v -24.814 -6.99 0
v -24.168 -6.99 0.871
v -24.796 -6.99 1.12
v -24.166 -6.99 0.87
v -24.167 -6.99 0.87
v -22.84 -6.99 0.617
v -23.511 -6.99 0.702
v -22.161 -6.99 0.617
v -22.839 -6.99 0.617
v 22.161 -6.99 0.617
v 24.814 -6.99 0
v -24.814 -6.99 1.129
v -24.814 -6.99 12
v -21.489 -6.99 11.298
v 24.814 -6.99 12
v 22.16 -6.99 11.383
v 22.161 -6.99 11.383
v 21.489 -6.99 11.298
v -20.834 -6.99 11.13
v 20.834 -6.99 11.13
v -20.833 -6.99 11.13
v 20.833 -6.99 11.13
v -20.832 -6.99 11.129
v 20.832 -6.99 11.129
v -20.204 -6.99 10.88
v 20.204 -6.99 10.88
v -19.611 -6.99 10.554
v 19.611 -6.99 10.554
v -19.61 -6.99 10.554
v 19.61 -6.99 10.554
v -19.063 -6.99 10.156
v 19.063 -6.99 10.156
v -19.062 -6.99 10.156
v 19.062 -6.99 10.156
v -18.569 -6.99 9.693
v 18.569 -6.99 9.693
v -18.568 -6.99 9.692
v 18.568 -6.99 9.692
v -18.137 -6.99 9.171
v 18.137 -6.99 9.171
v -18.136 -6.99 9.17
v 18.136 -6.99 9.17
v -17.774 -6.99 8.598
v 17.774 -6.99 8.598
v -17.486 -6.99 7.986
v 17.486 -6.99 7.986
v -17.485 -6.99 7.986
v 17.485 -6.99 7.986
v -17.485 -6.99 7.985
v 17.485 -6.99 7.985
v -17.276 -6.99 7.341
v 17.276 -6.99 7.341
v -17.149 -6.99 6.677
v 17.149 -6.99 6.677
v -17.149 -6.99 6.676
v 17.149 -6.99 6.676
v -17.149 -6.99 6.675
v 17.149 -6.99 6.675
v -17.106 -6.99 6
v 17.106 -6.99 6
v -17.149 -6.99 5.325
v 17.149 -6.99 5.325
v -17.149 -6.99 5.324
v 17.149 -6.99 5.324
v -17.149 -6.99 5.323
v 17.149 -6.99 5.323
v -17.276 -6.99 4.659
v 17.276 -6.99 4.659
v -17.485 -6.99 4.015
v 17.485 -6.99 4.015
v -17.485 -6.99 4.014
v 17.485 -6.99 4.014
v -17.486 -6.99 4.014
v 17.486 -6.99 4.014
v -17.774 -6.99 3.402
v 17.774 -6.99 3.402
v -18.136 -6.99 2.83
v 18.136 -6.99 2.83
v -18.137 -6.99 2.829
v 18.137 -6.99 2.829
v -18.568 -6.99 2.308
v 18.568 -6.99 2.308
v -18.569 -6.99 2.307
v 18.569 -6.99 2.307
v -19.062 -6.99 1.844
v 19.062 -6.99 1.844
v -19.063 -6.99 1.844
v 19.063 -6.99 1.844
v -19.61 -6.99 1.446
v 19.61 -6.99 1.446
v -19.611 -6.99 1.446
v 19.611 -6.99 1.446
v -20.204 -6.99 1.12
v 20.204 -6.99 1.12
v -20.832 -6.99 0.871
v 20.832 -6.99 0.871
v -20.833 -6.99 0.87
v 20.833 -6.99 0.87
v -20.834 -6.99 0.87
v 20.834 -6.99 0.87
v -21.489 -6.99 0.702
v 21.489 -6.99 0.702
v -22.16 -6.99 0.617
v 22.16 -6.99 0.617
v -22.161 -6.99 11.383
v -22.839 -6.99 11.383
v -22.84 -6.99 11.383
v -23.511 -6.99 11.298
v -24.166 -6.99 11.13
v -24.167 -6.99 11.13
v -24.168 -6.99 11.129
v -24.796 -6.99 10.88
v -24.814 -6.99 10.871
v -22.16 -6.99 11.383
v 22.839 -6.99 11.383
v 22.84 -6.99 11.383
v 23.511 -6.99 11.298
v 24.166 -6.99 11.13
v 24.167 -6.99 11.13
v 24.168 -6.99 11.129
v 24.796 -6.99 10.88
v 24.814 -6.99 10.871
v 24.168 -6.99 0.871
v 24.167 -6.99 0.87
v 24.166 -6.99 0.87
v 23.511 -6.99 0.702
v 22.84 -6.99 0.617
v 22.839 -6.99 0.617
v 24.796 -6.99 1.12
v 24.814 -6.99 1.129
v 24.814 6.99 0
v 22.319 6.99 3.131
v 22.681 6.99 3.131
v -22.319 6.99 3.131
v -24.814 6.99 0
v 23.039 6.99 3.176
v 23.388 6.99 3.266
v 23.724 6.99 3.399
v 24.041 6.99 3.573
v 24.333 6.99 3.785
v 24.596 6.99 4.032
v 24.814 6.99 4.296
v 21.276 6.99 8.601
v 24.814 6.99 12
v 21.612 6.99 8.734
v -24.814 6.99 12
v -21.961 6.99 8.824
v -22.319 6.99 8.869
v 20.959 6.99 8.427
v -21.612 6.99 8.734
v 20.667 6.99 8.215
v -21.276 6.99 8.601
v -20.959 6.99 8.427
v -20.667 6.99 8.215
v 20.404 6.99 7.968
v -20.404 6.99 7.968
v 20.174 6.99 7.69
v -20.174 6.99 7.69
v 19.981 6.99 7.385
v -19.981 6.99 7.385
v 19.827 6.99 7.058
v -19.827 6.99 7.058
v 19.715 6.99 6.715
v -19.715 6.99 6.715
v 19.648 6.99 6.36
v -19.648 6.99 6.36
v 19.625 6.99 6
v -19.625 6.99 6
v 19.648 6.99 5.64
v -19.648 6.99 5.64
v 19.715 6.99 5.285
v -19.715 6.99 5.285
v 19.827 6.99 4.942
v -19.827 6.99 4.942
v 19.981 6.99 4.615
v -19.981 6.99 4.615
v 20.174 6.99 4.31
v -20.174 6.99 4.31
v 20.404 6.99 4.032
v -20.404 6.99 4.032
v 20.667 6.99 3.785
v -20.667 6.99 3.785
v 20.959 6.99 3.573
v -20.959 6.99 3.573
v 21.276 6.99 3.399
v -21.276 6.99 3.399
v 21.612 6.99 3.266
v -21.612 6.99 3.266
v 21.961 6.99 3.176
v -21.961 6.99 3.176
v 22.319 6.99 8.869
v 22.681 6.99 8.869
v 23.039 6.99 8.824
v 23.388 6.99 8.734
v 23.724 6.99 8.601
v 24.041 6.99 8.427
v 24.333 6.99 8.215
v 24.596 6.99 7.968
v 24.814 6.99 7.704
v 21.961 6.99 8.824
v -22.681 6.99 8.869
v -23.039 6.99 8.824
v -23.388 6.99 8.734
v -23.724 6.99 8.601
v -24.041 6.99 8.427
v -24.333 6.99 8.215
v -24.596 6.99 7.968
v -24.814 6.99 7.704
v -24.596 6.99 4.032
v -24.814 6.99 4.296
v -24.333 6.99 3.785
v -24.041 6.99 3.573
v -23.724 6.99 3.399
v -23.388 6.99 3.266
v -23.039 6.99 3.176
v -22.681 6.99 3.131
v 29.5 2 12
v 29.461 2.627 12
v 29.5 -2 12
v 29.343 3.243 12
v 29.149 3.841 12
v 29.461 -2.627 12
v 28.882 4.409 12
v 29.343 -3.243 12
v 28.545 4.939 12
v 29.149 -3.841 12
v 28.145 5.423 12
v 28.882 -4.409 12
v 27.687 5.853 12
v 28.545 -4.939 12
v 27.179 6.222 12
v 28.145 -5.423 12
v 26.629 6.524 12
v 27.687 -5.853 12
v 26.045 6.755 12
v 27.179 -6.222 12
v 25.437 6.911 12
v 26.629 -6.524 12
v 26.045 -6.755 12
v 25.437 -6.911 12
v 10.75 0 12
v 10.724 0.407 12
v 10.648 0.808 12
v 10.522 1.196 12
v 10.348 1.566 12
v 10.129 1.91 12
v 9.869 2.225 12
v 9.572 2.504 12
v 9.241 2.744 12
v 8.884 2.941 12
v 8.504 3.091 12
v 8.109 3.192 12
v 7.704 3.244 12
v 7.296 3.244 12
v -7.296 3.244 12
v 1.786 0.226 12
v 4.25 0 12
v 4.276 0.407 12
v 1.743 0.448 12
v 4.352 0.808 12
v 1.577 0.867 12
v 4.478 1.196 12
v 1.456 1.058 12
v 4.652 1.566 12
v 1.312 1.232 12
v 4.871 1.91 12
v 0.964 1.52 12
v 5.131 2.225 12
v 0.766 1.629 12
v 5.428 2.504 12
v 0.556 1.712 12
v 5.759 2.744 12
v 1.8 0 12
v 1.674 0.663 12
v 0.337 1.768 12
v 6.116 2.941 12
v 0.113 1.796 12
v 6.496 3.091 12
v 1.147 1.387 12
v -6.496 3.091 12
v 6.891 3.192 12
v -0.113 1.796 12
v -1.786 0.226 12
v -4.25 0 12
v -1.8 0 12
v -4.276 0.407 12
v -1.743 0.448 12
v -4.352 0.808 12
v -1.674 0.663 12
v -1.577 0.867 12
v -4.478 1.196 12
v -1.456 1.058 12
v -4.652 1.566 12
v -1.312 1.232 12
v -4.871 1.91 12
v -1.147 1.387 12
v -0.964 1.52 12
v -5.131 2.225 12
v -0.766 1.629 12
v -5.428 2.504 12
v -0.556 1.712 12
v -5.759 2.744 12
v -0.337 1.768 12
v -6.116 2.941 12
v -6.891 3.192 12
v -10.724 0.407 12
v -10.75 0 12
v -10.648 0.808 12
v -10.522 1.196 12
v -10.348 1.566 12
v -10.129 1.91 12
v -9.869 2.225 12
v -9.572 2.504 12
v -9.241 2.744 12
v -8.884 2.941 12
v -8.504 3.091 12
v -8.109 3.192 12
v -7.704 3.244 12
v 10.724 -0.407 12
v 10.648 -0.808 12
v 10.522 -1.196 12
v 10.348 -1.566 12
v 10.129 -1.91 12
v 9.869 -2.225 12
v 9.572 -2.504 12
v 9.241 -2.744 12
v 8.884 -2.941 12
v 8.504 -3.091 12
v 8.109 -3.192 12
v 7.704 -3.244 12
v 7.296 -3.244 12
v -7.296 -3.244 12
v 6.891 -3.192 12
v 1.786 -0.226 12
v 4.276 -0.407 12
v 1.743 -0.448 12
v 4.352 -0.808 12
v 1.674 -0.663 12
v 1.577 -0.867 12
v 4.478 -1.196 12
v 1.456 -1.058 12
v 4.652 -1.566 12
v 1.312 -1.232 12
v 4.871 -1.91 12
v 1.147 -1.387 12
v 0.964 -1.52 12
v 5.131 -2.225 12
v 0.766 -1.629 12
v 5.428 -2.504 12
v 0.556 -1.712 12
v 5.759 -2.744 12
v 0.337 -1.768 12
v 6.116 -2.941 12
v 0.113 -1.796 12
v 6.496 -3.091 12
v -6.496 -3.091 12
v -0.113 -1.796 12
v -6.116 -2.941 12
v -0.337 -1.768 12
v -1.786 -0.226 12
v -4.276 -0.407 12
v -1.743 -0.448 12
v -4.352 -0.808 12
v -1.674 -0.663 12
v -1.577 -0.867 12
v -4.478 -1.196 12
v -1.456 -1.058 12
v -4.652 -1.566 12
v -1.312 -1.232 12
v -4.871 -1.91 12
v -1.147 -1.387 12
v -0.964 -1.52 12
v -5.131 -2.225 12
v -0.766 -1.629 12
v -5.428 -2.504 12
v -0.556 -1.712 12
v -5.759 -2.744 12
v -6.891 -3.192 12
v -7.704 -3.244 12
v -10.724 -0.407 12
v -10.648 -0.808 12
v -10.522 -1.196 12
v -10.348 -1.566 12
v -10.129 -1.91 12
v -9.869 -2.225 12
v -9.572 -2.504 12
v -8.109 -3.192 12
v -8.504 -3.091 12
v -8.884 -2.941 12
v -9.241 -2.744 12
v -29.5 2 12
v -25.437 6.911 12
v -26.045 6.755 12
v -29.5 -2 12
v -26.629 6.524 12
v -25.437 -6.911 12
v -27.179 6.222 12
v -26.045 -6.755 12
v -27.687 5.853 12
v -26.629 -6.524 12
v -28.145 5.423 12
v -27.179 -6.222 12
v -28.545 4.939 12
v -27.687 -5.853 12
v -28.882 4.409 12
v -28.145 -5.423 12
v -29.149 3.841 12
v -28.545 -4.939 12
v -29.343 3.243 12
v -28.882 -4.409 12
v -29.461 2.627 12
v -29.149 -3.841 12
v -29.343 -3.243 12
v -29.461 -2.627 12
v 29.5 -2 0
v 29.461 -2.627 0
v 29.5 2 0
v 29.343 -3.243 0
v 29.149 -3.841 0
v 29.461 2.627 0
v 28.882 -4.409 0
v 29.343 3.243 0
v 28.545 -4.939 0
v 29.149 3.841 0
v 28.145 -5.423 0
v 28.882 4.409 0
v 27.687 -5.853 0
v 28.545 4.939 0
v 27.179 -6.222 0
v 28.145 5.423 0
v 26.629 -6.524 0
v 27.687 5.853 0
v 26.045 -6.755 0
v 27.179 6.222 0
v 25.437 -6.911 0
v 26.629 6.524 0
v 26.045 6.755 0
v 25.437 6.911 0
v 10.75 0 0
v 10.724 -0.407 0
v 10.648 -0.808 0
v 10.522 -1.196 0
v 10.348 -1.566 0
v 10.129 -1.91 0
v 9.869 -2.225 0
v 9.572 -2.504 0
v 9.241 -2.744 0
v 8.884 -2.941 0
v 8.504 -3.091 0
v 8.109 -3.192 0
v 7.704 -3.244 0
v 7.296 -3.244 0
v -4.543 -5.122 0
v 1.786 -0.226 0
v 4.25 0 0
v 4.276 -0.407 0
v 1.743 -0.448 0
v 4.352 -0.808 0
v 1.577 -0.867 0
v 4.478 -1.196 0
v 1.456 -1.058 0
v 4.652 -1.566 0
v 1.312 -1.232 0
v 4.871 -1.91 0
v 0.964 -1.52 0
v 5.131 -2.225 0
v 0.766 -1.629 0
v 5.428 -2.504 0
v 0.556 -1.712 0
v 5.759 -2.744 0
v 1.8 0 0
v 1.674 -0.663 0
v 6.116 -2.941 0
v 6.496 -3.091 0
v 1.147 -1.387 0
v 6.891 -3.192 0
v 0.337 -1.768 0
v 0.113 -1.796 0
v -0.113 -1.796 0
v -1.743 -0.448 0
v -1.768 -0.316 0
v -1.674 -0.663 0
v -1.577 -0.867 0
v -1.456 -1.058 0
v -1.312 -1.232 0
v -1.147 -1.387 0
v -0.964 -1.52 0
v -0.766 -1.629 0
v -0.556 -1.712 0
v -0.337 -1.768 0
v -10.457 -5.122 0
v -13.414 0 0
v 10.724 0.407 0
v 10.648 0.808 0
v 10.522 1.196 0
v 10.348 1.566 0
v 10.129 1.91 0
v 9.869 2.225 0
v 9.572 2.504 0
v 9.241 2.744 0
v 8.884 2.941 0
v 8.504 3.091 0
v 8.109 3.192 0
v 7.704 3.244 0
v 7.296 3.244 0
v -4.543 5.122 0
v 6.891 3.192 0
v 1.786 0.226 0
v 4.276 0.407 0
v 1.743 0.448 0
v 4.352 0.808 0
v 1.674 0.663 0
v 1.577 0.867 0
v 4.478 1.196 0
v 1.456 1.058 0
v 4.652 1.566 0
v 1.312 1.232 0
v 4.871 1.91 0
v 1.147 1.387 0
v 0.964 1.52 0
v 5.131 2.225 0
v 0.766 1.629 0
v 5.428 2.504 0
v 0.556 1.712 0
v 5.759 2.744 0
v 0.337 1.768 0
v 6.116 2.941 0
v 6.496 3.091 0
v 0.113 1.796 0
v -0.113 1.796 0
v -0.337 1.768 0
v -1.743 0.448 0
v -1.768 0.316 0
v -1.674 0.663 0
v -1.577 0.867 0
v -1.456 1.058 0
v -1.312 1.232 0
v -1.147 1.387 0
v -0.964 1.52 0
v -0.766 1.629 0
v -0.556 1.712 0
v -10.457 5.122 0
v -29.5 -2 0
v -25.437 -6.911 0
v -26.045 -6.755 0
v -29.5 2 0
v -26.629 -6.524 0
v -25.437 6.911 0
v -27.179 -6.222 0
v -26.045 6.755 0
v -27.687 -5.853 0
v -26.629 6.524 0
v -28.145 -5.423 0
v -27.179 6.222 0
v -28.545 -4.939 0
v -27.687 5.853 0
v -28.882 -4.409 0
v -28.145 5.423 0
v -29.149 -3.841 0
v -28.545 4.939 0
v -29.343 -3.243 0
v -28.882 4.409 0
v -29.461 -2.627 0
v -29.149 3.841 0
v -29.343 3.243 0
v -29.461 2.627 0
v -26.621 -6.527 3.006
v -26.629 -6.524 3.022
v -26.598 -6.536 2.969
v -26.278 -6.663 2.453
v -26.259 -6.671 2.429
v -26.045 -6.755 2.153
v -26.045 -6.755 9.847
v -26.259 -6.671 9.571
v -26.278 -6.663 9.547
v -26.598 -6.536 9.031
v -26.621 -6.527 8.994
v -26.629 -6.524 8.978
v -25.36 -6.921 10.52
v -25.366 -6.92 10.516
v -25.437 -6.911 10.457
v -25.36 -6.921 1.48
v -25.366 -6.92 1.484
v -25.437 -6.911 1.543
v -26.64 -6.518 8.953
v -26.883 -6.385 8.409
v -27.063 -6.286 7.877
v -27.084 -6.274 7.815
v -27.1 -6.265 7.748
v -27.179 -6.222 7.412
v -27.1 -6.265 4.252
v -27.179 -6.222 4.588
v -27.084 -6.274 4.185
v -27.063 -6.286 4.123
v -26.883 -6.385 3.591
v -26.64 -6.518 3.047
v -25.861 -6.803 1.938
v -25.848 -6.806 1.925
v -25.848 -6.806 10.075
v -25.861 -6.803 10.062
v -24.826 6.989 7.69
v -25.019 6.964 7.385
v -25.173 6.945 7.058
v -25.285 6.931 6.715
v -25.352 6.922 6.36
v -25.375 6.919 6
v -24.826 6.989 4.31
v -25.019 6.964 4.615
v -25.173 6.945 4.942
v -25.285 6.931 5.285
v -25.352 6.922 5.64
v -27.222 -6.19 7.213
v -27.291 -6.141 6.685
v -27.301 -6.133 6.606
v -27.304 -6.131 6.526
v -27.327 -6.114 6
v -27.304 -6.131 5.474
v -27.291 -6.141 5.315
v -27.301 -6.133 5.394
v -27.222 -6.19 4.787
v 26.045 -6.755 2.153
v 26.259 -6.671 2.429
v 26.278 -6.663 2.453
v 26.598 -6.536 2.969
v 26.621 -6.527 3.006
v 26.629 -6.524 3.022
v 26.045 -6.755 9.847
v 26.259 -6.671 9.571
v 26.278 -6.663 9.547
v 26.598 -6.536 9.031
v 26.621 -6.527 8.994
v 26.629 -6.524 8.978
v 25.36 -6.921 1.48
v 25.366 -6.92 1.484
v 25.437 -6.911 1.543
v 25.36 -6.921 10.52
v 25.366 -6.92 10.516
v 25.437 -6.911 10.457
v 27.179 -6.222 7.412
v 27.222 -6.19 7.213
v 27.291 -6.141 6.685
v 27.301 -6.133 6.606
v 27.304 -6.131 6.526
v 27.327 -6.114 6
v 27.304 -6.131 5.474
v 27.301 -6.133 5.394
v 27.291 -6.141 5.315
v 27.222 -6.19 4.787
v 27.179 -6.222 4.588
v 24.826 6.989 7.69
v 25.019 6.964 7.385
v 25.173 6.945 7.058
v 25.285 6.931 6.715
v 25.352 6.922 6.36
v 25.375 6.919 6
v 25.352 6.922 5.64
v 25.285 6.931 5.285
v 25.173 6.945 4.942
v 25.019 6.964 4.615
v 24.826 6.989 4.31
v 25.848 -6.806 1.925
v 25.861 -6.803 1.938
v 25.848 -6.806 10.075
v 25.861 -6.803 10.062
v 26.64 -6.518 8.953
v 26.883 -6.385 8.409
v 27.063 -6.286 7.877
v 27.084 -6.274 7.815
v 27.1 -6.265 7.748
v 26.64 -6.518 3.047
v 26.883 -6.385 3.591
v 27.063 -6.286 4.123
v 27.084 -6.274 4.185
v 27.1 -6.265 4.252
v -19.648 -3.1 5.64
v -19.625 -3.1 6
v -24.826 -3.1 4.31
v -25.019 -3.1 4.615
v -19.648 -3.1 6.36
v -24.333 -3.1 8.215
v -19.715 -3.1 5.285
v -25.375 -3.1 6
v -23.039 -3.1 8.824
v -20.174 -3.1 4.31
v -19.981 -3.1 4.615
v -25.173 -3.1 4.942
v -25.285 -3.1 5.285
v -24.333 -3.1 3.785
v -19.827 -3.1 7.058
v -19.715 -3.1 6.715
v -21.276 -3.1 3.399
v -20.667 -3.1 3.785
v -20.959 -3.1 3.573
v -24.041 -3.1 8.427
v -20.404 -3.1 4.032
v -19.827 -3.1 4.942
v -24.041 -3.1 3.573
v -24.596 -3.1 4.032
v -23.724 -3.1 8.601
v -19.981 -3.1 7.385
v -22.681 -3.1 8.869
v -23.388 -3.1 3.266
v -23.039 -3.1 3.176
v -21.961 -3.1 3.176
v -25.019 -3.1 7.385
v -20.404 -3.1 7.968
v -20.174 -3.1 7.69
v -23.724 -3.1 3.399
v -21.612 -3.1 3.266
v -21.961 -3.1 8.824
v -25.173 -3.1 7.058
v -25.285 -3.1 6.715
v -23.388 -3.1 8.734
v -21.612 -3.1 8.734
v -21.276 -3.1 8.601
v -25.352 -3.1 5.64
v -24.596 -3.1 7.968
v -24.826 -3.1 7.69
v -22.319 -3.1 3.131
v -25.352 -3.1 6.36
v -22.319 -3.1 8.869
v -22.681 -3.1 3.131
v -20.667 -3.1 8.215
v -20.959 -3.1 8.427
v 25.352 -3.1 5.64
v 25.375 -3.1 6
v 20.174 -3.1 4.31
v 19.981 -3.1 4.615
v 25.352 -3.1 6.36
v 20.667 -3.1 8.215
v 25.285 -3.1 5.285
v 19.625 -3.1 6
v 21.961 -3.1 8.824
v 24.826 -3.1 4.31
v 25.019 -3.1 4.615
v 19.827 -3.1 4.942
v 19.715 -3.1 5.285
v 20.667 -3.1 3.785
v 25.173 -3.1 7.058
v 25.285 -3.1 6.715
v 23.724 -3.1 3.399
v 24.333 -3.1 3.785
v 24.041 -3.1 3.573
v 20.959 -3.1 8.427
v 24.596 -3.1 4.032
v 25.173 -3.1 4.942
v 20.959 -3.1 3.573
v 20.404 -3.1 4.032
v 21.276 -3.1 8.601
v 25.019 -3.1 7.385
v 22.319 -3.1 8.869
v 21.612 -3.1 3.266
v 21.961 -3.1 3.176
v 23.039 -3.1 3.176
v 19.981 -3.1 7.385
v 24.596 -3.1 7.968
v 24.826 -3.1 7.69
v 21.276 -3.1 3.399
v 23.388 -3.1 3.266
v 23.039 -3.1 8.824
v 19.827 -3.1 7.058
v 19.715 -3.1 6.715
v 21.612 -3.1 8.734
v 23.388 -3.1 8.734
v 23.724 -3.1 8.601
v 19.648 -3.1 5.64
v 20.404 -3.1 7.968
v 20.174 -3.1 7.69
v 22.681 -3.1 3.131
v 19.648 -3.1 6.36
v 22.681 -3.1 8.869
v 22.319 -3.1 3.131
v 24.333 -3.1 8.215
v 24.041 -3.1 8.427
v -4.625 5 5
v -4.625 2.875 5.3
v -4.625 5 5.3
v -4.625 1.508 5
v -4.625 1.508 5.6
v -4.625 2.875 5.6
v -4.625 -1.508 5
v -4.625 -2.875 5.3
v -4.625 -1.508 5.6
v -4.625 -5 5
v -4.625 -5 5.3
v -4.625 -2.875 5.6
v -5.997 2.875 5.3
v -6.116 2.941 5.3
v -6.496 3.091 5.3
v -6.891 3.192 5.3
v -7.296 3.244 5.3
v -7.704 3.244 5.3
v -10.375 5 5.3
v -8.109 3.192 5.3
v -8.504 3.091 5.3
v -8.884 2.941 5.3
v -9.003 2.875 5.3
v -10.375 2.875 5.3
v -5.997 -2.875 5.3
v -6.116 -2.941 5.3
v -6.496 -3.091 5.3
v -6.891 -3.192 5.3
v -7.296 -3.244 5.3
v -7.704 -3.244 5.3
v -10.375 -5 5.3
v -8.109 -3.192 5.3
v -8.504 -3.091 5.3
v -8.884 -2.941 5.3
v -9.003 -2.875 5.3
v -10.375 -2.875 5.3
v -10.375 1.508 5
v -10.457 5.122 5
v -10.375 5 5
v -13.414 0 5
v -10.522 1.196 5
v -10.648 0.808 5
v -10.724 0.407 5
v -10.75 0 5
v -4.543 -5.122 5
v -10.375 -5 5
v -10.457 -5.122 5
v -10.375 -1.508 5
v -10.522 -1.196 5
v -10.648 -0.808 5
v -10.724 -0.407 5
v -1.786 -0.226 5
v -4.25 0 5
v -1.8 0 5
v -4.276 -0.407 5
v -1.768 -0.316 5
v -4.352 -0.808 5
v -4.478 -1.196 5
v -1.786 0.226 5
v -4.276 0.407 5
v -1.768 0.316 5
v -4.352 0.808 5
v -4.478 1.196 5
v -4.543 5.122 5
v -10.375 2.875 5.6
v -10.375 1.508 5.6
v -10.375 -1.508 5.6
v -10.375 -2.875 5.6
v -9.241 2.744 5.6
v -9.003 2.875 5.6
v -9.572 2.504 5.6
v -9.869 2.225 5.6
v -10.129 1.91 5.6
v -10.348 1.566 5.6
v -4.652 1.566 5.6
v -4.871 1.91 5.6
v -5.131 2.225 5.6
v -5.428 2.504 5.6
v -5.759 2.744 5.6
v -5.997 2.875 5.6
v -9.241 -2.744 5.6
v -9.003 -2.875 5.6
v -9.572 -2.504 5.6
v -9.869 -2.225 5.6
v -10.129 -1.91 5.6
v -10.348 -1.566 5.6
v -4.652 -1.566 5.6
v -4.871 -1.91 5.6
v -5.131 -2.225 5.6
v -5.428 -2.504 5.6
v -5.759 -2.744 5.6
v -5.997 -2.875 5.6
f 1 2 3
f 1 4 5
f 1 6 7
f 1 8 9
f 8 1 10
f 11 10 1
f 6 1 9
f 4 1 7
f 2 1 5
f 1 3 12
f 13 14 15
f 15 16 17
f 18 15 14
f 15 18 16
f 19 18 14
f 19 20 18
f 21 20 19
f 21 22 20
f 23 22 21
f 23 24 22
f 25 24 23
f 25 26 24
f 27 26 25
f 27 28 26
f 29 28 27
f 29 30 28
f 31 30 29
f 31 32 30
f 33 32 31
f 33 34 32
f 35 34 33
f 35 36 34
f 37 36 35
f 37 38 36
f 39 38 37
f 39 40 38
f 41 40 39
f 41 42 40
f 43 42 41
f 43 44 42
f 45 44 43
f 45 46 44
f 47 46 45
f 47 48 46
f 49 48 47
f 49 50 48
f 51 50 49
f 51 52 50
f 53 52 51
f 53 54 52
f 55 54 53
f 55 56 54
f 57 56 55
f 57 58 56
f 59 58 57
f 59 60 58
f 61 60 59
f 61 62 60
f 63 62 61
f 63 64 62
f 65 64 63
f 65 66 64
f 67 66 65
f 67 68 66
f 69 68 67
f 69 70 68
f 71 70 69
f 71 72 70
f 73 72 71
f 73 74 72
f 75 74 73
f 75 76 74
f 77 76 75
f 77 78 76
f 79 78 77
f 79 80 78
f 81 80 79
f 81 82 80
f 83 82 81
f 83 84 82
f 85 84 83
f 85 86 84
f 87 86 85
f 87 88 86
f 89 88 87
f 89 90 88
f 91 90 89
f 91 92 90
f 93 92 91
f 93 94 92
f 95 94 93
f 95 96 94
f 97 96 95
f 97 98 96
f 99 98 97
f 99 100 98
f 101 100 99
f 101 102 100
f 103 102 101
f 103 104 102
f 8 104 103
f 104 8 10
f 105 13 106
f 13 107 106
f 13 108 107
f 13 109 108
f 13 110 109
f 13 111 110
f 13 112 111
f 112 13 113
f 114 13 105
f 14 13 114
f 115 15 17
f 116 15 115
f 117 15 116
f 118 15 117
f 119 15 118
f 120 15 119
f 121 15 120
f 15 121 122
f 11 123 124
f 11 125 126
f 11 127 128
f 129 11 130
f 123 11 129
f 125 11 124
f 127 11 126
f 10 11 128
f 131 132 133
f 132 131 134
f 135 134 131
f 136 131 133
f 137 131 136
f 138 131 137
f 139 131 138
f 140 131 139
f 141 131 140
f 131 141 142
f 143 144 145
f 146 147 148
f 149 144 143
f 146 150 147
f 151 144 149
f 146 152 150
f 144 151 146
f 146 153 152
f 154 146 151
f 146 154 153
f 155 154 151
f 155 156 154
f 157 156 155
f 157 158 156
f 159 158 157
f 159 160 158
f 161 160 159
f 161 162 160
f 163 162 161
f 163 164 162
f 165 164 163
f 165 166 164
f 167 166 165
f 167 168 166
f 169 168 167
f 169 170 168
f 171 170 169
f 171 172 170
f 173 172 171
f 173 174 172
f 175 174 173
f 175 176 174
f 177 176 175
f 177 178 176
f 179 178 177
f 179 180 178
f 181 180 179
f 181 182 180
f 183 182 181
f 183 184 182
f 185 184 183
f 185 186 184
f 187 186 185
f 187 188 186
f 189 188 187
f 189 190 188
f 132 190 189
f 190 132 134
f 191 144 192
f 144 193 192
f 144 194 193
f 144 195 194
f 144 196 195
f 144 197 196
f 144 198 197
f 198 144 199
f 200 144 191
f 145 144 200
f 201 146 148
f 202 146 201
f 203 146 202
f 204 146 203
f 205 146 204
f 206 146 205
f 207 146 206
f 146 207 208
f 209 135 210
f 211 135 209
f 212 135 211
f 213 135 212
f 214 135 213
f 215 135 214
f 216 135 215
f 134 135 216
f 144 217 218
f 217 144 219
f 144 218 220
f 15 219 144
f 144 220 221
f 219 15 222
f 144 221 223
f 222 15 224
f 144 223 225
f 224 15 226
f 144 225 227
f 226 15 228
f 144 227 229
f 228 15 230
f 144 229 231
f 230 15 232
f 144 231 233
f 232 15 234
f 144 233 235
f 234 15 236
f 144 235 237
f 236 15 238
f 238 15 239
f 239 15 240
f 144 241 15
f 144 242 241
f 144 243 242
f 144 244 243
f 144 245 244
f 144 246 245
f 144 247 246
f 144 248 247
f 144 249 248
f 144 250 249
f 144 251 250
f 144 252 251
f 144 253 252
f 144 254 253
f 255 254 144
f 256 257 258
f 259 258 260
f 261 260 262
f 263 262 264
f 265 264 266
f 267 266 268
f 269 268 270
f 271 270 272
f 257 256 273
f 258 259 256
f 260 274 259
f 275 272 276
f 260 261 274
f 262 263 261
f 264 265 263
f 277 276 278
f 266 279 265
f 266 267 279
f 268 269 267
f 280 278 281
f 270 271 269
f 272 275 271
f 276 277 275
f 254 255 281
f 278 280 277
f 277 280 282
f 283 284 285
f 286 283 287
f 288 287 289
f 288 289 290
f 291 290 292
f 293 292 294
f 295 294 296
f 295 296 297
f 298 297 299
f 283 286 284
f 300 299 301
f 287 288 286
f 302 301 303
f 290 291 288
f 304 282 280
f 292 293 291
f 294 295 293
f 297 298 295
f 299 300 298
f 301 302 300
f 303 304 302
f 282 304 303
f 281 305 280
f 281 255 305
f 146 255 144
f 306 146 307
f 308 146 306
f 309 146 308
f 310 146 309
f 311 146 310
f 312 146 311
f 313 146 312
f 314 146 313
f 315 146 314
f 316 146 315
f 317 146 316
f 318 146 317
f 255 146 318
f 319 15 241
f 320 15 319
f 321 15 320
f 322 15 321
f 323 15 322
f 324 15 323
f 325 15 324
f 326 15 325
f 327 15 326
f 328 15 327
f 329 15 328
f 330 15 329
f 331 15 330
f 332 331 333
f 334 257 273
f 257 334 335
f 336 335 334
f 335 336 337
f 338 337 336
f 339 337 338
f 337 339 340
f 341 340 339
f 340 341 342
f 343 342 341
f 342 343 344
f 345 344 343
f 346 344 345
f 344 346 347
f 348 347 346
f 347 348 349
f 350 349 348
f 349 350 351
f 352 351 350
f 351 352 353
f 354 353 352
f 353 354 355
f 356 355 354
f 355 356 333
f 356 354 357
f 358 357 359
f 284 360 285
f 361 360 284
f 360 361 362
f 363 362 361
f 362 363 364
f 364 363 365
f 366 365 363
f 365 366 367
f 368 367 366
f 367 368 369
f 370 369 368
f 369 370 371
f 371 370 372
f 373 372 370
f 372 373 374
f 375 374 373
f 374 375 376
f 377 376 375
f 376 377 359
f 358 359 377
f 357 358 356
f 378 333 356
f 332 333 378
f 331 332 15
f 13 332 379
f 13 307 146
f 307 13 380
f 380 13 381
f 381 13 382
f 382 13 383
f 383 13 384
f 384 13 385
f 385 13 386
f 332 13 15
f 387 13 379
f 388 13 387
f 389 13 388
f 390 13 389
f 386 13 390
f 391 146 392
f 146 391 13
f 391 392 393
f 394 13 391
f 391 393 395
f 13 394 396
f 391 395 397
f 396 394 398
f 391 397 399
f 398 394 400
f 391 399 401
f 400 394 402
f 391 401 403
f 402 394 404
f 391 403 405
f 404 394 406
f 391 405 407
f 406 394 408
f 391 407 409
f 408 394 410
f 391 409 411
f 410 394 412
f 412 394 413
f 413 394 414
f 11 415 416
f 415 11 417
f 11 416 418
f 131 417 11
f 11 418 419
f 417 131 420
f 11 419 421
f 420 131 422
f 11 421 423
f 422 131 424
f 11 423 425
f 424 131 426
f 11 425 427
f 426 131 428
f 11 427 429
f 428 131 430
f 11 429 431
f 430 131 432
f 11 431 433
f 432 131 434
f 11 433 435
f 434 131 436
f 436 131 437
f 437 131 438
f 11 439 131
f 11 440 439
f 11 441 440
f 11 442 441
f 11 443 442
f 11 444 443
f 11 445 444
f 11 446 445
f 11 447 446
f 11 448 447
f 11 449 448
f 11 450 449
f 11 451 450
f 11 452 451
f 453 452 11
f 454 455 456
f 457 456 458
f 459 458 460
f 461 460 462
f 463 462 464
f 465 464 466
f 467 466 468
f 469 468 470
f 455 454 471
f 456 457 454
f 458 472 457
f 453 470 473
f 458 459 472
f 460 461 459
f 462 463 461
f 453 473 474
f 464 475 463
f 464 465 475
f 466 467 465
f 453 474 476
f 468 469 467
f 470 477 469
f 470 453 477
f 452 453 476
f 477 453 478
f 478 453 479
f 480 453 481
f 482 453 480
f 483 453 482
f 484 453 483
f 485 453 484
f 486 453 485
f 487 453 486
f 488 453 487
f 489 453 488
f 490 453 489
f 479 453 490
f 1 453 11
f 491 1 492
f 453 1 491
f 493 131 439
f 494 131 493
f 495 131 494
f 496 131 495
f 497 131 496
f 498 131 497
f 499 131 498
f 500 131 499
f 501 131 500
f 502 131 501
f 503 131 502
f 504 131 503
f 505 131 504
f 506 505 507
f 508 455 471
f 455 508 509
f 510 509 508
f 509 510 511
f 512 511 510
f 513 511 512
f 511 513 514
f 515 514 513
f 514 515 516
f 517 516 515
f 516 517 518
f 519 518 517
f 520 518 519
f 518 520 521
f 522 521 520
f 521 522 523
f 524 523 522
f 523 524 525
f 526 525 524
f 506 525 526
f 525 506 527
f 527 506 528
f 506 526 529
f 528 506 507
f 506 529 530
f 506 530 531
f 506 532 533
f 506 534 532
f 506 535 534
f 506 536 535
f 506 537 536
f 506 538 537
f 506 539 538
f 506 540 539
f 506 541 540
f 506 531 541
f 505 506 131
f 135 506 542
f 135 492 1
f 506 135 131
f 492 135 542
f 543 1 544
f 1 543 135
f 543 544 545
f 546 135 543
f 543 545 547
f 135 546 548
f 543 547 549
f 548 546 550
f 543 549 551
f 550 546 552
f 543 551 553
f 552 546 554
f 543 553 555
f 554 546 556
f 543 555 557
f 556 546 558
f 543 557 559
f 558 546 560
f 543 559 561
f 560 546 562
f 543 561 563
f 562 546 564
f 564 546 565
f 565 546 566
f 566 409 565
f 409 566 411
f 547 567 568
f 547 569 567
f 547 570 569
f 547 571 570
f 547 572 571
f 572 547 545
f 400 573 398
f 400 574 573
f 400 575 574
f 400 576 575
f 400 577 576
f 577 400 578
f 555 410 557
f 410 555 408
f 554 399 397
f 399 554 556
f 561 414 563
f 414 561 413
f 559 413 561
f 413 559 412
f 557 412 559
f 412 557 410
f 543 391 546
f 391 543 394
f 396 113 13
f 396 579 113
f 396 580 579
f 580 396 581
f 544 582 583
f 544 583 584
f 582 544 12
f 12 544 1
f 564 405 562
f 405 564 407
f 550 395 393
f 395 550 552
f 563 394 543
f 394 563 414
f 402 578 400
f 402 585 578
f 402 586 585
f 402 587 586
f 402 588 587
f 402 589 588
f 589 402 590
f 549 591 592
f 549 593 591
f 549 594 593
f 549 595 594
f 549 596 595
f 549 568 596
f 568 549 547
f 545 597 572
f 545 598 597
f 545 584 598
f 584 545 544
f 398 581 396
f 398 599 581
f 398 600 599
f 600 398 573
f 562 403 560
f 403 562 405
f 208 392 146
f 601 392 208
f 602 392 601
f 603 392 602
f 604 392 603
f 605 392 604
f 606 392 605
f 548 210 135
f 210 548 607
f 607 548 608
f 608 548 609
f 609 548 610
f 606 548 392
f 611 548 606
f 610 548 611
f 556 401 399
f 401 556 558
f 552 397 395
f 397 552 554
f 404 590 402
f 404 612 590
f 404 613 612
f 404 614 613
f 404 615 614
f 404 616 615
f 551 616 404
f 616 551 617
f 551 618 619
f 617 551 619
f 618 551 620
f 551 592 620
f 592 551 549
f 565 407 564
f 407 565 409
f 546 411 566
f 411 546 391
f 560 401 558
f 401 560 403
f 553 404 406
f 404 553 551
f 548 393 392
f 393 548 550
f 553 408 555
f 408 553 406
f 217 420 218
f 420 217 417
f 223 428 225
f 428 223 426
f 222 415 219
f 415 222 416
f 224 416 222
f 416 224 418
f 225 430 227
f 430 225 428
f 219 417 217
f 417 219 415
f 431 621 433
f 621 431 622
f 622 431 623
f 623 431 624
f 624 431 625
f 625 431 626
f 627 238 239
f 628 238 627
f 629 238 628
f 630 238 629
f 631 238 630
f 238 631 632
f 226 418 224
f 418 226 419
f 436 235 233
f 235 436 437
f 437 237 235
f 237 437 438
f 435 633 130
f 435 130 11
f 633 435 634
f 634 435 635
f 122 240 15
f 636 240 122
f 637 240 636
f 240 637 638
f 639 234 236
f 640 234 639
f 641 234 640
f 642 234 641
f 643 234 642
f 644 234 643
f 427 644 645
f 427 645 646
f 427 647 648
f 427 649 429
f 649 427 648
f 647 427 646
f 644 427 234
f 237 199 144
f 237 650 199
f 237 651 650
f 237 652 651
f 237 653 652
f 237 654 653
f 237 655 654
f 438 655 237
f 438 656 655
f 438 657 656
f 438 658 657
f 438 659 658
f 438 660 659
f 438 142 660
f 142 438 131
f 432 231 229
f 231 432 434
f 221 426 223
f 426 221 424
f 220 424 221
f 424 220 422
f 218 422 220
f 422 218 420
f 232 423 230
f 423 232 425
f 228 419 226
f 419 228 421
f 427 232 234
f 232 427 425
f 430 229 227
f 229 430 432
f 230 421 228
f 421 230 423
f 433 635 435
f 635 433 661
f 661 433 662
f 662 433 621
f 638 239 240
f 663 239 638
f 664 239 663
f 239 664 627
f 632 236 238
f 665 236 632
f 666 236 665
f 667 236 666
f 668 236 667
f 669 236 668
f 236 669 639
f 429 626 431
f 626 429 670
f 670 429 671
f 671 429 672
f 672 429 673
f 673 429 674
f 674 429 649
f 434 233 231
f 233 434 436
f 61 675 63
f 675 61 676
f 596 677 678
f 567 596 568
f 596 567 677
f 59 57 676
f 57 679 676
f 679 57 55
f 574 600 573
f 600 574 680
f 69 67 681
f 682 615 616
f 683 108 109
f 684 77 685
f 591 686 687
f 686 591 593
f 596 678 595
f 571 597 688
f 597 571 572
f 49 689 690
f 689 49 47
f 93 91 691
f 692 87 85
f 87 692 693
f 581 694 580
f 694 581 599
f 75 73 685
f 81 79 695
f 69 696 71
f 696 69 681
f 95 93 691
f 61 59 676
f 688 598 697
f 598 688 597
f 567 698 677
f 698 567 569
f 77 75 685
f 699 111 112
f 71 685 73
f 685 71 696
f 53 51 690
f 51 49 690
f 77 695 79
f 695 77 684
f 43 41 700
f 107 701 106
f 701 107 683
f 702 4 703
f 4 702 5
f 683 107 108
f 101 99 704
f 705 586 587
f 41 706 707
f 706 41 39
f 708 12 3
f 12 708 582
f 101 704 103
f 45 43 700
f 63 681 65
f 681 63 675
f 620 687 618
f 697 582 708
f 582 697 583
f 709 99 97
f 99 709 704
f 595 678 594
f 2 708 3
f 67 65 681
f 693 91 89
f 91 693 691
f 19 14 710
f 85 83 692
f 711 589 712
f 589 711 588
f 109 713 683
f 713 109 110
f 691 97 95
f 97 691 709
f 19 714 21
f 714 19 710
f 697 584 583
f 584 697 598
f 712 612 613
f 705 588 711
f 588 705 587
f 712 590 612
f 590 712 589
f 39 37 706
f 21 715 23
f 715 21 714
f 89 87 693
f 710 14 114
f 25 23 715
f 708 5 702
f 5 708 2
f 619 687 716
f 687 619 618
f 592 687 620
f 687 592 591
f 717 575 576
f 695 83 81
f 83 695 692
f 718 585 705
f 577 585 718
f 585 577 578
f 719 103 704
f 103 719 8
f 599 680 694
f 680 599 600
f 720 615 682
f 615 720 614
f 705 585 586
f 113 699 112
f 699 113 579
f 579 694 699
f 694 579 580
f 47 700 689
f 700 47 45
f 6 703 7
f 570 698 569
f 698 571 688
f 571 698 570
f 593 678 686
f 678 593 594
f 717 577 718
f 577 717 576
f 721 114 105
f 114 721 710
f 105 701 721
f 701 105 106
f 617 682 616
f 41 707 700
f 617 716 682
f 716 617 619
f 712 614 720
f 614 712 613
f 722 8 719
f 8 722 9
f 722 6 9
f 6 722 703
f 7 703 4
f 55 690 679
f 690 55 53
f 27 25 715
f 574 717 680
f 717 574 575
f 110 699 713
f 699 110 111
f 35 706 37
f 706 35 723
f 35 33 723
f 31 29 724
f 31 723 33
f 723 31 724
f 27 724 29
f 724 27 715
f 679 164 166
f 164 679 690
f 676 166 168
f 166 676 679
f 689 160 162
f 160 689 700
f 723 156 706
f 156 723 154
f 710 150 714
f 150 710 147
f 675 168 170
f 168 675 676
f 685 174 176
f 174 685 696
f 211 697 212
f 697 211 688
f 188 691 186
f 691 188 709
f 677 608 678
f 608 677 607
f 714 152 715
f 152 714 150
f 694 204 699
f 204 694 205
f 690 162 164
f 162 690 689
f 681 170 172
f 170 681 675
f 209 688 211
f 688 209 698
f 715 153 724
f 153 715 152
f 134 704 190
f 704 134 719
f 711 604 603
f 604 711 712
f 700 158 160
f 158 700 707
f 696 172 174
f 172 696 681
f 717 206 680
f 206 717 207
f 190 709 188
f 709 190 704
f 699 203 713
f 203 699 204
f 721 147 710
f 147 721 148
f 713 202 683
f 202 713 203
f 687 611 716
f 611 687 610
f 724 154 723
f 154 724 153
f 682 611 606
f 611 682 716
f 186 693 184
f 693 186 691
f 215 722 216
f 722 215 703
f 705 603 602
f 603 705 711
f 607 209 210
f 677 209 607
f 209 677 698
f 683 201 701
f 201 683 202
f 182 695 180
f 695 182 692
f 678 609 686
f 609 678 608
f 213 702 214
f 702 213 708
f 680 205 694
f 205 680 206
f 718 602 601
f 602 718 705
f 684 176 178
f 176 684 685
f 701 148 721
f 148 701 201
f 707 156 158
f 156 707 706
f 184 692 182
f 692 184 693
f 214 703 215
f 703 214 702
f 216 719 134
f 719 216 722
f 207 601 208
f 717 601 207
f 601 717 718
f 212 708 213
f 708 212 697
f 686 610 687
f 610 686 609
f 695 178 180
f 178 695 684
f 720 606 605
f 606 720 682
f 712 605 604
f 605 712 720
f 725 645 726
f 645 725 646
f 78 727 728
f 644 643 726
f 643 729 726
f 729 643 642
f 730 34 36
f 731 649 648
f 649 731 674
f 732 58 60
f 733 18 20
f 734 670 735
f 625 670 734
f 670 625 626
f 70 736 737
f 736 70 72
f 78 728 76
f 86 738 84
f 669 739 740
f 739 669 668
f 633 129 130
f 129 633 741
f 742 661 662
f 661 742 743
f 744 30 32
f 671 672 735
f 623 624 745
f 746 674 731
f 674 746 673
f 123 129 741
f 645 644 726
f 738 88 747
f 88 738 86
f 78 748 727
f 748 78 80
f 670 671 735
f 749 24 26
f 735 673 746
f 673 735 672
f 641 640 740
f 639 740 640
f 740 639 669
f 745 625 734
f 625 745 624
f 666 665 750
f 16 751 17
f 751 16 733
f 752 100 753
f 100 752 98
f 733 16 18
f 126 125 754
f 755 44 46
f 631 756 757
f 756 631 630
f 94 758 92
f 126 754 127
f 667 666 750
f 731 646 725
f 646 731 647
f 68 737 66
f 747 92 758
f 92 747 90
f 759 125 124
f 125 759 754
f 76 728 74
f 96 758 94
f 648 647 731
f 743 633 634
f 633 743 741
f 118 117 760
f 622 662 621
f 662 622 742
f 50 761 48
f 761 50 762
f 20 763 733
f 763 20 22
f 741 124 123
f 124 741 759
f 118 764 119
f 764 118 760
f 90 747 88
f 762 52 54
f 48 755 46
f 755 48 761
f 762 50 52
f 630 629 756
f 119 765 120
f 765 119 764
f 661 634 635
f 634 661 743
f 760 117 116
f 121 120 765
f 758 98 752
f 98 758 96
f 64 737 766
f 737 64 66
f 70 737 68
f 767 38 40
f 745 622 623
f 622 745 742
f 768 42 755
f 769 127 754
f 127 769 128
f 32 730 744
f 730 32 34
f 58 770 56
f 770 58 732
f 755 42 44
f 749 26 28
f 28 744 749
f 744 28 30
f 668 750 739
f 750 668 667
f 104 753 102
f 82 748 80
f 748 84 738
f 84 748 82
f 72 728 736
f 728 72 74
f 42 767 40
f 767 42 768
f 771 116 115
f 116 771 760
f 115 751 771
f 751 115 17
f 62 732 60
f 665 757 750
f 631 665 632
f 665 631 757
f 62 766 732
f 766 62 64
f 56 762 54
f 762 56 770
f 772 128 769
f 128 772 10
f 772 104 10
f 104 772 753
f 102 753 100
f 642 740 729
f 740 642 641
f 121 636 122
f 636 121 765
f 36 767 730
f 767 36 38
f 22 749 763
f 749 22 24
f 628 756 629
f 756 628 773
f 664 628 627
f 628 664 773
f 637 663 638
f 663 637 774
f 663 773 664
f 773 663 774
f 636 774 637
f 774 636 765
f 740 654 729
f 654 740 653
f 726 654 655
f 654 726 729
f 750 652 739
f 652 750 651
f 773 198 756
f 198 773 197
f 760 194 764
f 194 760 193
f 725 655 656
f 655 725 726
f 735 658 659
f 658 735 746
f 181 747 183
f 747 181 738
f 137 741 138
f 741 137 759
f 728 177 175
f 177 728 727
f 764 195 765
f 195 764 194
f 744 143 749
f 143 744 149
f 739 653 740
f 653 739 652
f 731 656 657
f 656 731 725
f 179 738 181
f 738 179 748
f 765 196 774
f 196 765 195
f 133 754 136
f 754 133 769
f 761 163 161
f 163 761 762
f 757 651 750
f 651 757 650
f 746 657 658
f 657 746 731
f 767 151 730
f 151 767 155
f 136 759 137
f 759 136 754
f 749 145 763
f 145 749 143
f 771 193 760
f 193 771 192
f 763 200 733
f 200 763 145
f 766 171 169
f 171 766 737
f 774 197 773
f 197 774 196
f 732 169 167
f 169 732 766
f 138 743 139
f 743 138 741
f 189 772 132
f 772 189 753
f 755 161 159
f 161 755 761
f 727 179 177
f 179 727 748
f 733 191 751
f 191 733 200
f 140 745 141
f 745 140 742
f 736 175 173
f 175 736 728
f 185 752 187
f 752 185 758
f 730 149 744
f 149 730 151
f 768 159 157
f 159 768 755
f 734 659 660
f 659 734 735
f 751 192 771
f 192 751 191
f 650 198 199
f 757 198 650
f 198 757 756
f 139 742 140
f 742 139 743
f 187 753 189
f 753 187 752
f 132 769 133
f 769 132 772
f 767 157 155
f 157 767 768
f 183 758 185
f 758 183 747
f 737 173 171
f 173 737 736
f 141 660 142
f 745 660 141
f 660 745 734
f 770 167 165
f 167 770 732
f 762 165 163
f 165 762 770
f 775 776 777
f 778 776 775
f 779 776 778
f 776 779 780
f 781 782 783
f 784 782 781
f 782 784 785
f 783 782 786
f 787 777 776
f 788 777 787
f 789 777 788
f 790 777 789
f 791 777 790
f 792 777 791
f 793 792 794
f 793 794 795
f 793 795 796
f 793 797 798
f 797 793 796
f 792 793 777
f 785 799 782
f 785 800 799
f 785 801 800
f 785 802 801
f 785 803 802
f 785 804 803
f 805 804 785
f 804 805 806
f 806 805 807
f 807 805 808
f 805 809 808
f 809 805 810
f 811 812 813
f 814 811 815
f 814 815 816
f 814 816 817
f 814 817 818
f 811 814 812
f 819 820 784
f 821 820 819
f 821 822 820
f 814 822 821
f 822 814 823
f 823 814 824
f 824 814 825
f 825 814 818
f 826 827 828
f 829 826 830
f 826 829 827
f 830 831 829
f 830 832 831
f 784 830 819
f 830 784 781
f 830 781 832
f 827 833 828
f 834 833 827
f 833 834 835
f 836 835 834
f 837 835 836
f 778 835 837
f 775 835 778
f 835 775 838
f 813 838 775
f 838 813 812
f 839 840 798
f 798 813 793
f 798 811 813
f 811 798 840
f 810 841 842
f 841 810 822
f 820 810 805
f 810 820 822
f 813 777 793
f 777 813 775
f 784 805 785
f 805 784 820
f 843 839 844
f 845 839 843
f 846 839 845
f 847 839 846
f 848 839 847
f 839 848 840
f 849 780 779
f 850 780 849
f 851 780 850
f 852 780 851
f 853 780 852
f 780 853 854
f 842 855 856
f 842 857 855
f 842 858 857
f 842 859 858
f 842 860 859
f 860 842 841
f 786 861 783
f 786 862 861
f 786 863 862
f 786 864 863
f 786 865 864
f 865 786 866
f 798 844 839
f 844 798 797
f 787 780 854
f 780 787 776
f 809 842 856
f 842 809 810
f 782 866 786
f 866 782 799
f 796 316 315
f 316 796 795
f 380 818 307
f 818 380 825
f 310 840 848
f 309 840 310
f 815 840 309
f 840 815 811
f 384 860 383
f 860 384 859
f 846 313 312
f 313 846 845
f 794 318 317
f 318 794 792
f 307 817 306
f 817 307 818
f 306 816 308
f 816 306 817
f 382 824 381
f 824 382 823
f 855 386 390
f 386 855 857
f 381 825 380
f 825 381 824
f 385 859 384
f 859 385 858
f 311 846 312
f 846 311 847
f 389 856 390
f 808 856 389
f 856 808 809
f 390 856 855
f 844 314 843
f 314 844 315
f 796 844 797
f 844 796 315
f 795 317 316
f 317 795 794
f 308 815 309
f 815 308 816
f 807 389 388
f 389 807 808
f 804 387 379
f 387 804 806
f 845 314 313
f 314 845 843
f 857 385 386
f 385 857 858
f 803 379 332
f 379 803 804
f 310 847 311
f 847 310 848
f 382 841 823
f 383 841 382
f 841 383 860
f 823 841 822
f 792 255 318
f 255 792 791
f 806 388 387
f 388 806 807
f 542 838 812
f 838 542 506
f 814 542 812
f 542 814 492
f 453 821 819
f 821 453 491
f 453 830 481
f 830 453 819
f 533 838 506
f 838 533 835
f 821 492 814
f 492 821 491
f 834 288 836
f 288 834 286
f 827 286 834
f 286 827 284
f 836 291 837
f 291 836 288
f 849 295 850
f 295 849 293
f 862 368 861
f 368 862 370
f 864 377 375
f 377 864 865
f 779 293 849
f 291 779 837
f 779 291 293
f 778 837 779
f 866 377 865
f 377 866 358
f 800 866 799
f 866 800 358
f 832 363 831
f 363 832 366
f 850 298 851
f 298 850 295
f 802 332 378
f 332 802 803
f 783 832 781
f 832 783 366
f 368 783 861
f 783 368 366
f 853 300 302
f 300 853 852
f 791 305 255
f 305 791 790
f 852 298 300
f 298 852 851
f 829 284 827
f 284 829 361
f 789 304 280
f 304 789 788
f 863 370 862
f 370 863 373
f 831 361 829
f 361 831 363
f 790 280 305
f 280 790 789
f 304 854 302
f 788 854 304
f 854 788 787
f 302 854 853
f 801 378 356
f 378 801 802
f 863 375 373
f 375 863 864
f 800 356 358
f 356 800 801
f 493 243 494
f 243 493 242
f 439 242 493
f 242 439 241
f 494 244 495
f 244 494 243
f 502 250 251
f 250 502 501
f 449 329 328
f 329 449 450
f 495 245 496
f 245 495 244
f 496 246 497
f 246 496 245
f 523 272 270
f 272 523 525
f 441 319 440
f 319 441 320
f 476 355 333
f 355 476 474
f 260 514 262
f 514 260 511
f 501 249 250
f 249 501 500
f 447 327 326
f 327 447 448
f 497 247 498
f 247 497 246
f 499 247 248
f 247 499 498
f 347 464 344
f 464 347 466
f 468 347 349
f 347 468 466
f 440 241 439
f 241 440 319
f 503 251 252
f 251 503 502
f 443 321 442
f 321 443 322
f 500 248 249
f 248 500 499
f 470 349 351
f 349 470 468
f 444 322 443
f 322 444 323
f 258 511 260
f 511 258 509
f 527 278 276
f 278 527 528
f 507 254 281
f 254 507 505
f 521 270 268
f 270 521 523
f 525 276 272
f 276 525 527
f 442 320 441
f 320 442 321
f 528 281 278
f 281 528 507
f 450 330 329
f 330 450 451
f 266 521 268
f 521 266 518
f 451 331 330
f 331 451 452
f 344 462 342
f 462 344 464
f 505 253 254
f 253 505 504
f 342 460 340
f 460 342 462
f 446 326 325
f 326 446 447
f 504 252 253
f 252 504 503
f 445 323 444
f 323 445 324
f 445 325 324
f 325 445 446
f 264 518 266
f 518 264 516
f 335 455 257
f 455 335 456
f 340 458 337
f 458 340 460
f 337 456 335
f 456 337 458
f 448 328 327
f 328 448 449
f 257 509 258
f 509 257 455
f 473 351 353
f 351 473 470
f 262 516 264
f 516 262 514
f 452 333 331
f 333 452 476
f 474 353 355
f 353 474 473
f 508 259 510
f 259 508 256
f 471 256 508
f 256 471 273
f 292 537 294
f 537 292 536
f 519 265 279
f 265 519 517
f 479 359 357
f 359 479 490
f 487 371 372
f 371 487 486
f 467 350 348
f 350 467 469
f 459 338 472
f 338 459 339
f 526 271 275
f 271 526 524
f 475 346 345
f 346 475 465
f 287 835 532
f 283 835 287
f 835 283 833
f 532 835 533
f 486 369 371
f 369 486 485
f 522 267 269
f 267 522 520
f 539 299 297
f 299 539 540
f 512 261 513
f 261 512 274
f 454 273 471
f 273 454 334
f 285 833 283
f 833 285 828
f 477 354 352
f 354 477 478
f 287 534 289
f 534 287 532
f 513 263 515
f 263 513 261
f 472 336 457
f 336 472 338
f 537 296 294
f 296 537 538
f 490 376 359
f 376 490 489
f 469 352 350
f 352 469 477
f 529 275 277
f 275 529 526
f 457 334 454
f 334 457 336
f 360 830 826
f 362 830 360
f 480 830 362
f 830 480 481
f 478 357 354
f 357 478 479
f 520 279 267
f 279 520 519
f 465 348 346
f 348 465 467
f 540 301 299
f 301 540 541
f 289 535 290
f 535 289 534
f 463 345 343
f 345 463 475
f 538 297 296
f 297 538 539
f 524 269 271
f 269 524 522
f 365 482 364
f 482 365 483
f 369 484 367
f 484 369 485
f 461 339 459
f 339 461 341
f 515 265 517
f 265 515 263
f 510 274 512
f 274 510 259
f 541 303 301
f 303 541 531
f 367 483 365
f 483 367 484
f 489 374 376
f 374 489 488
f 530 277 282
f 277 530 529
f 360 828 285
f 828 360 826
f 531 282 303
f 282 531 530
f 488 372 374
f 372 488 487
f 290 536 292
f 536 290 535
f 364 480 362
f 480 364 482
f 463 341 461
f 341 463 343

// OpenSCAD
$fn = 50;


difference() {
	union() {
		hull() {
			translate(v = [-9.5000000000, 2.0000000000, 0]) {
				cylinder(h = 12, r = 5);
			}
			translate(v = [9.5000000000, 2.0000000000, 0]) {
				cylinder(h = 12, r = 5);
			}
			translate(v = [-9.5000000000, -2.0000000000, 0]) {
				cylinder(h = 12, r = 5);
			}
			translate(v = [9.5000000000, -2.0000000000, 0]) {
				cylinder(h = 12, r = 5);
			}
		}
		translate(v = [-15.0000000000, 0.0000000000, 0]) {
			hull() {
				translate(v = [-9.5000000000, 2.0000000000, 0]) {
					cylinder(h = 12, r = 5);
				}
				translate(v = [9.5000000000, 2.0000000000, 0]) {
					cylinder(h = 12, r = 5);
				}
				translate(v = [-9.5000000000, -2.0000000000, 0]) {
					cylinder(h = 12, r = 5);
				}
				translate(v = [9.5000000000, -2.0000000000, 0]) {
					cylinder(h = 12, r = 5);
				}
			}
		}
		translate(v = [-15.0000000000, 0.0000000000, 0]) {
			hull() {
				translate(v = [-9.5000000000, 2.0000000000, 0]) {
					cylinder(h = 12, r = 5);
				}
				translate(v = [9.5000000000, 2.0000000000, 0]) {
					cylinder(h = 12, r = 5);
				}
				translate(v = [-9.5000000000, -2.0000000000, 0]) {
					cylinder(h = 12, r = 5);
				}
				translate(v = [9.5000000000, -2.0000000000, 0]) {
					cylinder(h = 12, r = 5);
				}
			}
		}
		translate(v = [15.0000000000, 0.0000000000, 0]) {
			hull() {
				translate(v = [-9.5000000000, 2.0000000000, 0]) {
					cylinder(h = 12, r = 5);
				}
				translate(v = [9.5000000000, 2.0000000000, 0]) {
					cylinder(h = 12, r = 5);
				}
				translate(v = [-9.5000000000, -2.0000000000, 0]) {
					cylinder(h = 12, r = 5);
				}
				translate(v = [9.5000000000, -2.0000000000, 0]) {
					cylinder(h = 12, r = 5);
				}
			}
		}
		translate(v = [15.0000000000, 0.0000000000, 0]) {
			hull() {
				translate(v = [-9.5000000000, 2.0000000000, 0]) {
					cylinder(h = 12, r = 5);
				}
				translate(v = [9.5000000000, 2.0000000000, 0]) {
					cylinder(h = 12, r = 5);
				}
				translate(v = [-9.5000000000, -2.0000000000, 0]) {
					cylinder(h = 12, r = 5);
				}
				translate(v = [9.5000000000, -2.0000000000, 0]) {
					cylinder(h = 12, r = 5);
				}
			}
		}
	}
	union() {
		translate(v = [-22.5000000000, -7.0000000000, 6.0000000000]) {
			rotate(a = [90, 0, 0]) {
				difference() {
					union() {
						#translate(v = [0, 0, -14.0000000000]) {
							cylinder(h = 14, r = 2.6000000000);
						}
						#translate(v = [0, 0, -3.9000000000]) {
							cylinder(h = 3.9000000000, r1 = 2.8750000000, r2 = 5.4000000000);
						}
						#translate(v = [0, 0, -14.0000000000]) {
							cylinder(h = 14, r = 2.8750000000);
						}
						#translate(v = [0, 0, -14.0000000000]) {
							cylinder(h = 14, r = 2.6000000000);
						}
					}
					union();
				}
			}
		}
		translate(v = [22.5000000000, -7.0000000000, 6.0000000000]) {
			rotate(a = [90, 0, 0]) {
				difference() {
					union() {
						#translate(v = [0, 0, -14.0000000000]) {
							cylinder(h = 14, r = 2.6000000000);
						}
						#translate(v = [0, 0, -3.9000000000]) {
							cylinder(h = 3.9000000000, r1 = 2.8750000000, r2 = 5.4000000000);
						}
						#translate(v = [0, 0, -14.0000000000]) {
							cylinder(h = 14, r = 2.8750000000);
						}
						#translate(v = [0, 0, -14.0000000000]) {
							cylinder(h = 14, r = 2.6000000000);
						}
					}
					union();
				}
			}
		}
		translate(v = [-7.5000000000, 0.0000000000, 0]) {
			rotate(a = [0, 0, 0]) {
				difference() {
					union() {
						#translate(v = [-2.8750000000, -5.0000000000, -0.3000000000]) {
							cube(size = [5.7500000000, 10, 0.3000000000]);
						}
						#translate(v = [-2.8750000000, -2.8750000000, -0.6000000000]) {
							cube(size = [5.7500000000, 5.7500000000, 0.3000000000]);
						}
						#translate(v = [-2.8750000000, -5.0000000000, 5]) {
							cube(size = [5.7500000000, 10, 0.3000000000]);
						}
						#translate(v = [-2.8750000000, -2.8750000000, 5.3000000000]) {
							cube(size = [5.7500000000, 5.7500000000, 0.3000000000]);
						}
						#translate(v = [0, 0, -100.0000000000]) {
							cylinder(h = 200, r = 3.2500000000);
						}
						#linear_extrude(height = 5) {
							polygon(points = [[5.9142500000, 0.0000000000], [2.9571250000, 5.1218907443], [-2.9571250000, 5.1218907443], [-5.9142500000, 0.0000000000], [-2.9571250000, -5.1218907443], [2.9571250000, -5.1218907443]]);
						}
						#translate(v = [-2.8750000000, -5.0000000000, -0.3000000000]) {
							cube(size = [5.7500000000, 10, 0.3000000000]);
						}
						#translate(v = [-2.8750000000, -2.8750000000, -0.6000000000]) {
							cube(size = [5.7500000000, 5.7500000000, 0.3000000000]);
						}
						#translate(v = [-2.8750000000, -5.0000000000, 5]) {
							cube(size = [5.7500000000, 10, 0.3000000000]);
						}
						#translate(v = [-2.8750000000, -2.8750000000, 5.3000000000]) {
							cube(size = [5.7500000000, 5.7500000000, 0.3000000000]);
						}
						#translate(v = [0, 0, -100.0000000000]) {
							cylinder(h = 200, r = 3.2500000000);
						}
						#translate(v = [-2.8750000000, -5.0000000000, -0.3000000000]) {
							cube(size = [5.7500000000, 10, 0.3000000000]);
						}
						#translate(v = [-2.8750000000, -2.8750000000, -0.6000000000]) {
							cube(size = [5.7500000000, 5.7500000000, 0.3000000000]);
						}
						#translate(v = [-2.8750000000, -5.0000000000, 5]) {
							cube(size = [5.7500000000, 10, 0.3000000000]);
						}
						#translate(v = [-2.8750000000, -2.8750000000, 5.3000000000]) {
							cube(size = [5.7500000000, 5.7500000000, 0.3000000000]);
						}
						#translate(v = [0, 0, -100.0000000000]) {
							cylinder(h = 200, r = 3.2500000000);
						}
					}
					union();
				}
			}
		}
		translate(v = [-7.5000000000, 0.0000000000, 0]) {
			translate(v = [0, 0, -100]) {
				cylinder(h = 200, r = 3.2500000000);
			}
		}
		translate(v = [7.5000000000, 0.0000000000, 0]) {
			translate(v = [0, 0, -100]) {
				cylinder(h = 200, r = 3.2500000000);
			}
		}
		translate(v = [-7.5000000000, 0.0000000000, 0]) {
			translate(v = [0, 0, -100]) {
				cylinder(h = 200, r = 1.8000000000);
			}
		}
		translate(v = [0, 0, -100]) {
			cylinder(h = 200, r = 1.8000000000);
		}
		translate(v = [7.5000000000, 0.0000000000, 0]) {
			translate(v = [0, 0, -100]) {
				cylinder(h = 200, r = 1.8000000000);
			}
		}
	}
}
